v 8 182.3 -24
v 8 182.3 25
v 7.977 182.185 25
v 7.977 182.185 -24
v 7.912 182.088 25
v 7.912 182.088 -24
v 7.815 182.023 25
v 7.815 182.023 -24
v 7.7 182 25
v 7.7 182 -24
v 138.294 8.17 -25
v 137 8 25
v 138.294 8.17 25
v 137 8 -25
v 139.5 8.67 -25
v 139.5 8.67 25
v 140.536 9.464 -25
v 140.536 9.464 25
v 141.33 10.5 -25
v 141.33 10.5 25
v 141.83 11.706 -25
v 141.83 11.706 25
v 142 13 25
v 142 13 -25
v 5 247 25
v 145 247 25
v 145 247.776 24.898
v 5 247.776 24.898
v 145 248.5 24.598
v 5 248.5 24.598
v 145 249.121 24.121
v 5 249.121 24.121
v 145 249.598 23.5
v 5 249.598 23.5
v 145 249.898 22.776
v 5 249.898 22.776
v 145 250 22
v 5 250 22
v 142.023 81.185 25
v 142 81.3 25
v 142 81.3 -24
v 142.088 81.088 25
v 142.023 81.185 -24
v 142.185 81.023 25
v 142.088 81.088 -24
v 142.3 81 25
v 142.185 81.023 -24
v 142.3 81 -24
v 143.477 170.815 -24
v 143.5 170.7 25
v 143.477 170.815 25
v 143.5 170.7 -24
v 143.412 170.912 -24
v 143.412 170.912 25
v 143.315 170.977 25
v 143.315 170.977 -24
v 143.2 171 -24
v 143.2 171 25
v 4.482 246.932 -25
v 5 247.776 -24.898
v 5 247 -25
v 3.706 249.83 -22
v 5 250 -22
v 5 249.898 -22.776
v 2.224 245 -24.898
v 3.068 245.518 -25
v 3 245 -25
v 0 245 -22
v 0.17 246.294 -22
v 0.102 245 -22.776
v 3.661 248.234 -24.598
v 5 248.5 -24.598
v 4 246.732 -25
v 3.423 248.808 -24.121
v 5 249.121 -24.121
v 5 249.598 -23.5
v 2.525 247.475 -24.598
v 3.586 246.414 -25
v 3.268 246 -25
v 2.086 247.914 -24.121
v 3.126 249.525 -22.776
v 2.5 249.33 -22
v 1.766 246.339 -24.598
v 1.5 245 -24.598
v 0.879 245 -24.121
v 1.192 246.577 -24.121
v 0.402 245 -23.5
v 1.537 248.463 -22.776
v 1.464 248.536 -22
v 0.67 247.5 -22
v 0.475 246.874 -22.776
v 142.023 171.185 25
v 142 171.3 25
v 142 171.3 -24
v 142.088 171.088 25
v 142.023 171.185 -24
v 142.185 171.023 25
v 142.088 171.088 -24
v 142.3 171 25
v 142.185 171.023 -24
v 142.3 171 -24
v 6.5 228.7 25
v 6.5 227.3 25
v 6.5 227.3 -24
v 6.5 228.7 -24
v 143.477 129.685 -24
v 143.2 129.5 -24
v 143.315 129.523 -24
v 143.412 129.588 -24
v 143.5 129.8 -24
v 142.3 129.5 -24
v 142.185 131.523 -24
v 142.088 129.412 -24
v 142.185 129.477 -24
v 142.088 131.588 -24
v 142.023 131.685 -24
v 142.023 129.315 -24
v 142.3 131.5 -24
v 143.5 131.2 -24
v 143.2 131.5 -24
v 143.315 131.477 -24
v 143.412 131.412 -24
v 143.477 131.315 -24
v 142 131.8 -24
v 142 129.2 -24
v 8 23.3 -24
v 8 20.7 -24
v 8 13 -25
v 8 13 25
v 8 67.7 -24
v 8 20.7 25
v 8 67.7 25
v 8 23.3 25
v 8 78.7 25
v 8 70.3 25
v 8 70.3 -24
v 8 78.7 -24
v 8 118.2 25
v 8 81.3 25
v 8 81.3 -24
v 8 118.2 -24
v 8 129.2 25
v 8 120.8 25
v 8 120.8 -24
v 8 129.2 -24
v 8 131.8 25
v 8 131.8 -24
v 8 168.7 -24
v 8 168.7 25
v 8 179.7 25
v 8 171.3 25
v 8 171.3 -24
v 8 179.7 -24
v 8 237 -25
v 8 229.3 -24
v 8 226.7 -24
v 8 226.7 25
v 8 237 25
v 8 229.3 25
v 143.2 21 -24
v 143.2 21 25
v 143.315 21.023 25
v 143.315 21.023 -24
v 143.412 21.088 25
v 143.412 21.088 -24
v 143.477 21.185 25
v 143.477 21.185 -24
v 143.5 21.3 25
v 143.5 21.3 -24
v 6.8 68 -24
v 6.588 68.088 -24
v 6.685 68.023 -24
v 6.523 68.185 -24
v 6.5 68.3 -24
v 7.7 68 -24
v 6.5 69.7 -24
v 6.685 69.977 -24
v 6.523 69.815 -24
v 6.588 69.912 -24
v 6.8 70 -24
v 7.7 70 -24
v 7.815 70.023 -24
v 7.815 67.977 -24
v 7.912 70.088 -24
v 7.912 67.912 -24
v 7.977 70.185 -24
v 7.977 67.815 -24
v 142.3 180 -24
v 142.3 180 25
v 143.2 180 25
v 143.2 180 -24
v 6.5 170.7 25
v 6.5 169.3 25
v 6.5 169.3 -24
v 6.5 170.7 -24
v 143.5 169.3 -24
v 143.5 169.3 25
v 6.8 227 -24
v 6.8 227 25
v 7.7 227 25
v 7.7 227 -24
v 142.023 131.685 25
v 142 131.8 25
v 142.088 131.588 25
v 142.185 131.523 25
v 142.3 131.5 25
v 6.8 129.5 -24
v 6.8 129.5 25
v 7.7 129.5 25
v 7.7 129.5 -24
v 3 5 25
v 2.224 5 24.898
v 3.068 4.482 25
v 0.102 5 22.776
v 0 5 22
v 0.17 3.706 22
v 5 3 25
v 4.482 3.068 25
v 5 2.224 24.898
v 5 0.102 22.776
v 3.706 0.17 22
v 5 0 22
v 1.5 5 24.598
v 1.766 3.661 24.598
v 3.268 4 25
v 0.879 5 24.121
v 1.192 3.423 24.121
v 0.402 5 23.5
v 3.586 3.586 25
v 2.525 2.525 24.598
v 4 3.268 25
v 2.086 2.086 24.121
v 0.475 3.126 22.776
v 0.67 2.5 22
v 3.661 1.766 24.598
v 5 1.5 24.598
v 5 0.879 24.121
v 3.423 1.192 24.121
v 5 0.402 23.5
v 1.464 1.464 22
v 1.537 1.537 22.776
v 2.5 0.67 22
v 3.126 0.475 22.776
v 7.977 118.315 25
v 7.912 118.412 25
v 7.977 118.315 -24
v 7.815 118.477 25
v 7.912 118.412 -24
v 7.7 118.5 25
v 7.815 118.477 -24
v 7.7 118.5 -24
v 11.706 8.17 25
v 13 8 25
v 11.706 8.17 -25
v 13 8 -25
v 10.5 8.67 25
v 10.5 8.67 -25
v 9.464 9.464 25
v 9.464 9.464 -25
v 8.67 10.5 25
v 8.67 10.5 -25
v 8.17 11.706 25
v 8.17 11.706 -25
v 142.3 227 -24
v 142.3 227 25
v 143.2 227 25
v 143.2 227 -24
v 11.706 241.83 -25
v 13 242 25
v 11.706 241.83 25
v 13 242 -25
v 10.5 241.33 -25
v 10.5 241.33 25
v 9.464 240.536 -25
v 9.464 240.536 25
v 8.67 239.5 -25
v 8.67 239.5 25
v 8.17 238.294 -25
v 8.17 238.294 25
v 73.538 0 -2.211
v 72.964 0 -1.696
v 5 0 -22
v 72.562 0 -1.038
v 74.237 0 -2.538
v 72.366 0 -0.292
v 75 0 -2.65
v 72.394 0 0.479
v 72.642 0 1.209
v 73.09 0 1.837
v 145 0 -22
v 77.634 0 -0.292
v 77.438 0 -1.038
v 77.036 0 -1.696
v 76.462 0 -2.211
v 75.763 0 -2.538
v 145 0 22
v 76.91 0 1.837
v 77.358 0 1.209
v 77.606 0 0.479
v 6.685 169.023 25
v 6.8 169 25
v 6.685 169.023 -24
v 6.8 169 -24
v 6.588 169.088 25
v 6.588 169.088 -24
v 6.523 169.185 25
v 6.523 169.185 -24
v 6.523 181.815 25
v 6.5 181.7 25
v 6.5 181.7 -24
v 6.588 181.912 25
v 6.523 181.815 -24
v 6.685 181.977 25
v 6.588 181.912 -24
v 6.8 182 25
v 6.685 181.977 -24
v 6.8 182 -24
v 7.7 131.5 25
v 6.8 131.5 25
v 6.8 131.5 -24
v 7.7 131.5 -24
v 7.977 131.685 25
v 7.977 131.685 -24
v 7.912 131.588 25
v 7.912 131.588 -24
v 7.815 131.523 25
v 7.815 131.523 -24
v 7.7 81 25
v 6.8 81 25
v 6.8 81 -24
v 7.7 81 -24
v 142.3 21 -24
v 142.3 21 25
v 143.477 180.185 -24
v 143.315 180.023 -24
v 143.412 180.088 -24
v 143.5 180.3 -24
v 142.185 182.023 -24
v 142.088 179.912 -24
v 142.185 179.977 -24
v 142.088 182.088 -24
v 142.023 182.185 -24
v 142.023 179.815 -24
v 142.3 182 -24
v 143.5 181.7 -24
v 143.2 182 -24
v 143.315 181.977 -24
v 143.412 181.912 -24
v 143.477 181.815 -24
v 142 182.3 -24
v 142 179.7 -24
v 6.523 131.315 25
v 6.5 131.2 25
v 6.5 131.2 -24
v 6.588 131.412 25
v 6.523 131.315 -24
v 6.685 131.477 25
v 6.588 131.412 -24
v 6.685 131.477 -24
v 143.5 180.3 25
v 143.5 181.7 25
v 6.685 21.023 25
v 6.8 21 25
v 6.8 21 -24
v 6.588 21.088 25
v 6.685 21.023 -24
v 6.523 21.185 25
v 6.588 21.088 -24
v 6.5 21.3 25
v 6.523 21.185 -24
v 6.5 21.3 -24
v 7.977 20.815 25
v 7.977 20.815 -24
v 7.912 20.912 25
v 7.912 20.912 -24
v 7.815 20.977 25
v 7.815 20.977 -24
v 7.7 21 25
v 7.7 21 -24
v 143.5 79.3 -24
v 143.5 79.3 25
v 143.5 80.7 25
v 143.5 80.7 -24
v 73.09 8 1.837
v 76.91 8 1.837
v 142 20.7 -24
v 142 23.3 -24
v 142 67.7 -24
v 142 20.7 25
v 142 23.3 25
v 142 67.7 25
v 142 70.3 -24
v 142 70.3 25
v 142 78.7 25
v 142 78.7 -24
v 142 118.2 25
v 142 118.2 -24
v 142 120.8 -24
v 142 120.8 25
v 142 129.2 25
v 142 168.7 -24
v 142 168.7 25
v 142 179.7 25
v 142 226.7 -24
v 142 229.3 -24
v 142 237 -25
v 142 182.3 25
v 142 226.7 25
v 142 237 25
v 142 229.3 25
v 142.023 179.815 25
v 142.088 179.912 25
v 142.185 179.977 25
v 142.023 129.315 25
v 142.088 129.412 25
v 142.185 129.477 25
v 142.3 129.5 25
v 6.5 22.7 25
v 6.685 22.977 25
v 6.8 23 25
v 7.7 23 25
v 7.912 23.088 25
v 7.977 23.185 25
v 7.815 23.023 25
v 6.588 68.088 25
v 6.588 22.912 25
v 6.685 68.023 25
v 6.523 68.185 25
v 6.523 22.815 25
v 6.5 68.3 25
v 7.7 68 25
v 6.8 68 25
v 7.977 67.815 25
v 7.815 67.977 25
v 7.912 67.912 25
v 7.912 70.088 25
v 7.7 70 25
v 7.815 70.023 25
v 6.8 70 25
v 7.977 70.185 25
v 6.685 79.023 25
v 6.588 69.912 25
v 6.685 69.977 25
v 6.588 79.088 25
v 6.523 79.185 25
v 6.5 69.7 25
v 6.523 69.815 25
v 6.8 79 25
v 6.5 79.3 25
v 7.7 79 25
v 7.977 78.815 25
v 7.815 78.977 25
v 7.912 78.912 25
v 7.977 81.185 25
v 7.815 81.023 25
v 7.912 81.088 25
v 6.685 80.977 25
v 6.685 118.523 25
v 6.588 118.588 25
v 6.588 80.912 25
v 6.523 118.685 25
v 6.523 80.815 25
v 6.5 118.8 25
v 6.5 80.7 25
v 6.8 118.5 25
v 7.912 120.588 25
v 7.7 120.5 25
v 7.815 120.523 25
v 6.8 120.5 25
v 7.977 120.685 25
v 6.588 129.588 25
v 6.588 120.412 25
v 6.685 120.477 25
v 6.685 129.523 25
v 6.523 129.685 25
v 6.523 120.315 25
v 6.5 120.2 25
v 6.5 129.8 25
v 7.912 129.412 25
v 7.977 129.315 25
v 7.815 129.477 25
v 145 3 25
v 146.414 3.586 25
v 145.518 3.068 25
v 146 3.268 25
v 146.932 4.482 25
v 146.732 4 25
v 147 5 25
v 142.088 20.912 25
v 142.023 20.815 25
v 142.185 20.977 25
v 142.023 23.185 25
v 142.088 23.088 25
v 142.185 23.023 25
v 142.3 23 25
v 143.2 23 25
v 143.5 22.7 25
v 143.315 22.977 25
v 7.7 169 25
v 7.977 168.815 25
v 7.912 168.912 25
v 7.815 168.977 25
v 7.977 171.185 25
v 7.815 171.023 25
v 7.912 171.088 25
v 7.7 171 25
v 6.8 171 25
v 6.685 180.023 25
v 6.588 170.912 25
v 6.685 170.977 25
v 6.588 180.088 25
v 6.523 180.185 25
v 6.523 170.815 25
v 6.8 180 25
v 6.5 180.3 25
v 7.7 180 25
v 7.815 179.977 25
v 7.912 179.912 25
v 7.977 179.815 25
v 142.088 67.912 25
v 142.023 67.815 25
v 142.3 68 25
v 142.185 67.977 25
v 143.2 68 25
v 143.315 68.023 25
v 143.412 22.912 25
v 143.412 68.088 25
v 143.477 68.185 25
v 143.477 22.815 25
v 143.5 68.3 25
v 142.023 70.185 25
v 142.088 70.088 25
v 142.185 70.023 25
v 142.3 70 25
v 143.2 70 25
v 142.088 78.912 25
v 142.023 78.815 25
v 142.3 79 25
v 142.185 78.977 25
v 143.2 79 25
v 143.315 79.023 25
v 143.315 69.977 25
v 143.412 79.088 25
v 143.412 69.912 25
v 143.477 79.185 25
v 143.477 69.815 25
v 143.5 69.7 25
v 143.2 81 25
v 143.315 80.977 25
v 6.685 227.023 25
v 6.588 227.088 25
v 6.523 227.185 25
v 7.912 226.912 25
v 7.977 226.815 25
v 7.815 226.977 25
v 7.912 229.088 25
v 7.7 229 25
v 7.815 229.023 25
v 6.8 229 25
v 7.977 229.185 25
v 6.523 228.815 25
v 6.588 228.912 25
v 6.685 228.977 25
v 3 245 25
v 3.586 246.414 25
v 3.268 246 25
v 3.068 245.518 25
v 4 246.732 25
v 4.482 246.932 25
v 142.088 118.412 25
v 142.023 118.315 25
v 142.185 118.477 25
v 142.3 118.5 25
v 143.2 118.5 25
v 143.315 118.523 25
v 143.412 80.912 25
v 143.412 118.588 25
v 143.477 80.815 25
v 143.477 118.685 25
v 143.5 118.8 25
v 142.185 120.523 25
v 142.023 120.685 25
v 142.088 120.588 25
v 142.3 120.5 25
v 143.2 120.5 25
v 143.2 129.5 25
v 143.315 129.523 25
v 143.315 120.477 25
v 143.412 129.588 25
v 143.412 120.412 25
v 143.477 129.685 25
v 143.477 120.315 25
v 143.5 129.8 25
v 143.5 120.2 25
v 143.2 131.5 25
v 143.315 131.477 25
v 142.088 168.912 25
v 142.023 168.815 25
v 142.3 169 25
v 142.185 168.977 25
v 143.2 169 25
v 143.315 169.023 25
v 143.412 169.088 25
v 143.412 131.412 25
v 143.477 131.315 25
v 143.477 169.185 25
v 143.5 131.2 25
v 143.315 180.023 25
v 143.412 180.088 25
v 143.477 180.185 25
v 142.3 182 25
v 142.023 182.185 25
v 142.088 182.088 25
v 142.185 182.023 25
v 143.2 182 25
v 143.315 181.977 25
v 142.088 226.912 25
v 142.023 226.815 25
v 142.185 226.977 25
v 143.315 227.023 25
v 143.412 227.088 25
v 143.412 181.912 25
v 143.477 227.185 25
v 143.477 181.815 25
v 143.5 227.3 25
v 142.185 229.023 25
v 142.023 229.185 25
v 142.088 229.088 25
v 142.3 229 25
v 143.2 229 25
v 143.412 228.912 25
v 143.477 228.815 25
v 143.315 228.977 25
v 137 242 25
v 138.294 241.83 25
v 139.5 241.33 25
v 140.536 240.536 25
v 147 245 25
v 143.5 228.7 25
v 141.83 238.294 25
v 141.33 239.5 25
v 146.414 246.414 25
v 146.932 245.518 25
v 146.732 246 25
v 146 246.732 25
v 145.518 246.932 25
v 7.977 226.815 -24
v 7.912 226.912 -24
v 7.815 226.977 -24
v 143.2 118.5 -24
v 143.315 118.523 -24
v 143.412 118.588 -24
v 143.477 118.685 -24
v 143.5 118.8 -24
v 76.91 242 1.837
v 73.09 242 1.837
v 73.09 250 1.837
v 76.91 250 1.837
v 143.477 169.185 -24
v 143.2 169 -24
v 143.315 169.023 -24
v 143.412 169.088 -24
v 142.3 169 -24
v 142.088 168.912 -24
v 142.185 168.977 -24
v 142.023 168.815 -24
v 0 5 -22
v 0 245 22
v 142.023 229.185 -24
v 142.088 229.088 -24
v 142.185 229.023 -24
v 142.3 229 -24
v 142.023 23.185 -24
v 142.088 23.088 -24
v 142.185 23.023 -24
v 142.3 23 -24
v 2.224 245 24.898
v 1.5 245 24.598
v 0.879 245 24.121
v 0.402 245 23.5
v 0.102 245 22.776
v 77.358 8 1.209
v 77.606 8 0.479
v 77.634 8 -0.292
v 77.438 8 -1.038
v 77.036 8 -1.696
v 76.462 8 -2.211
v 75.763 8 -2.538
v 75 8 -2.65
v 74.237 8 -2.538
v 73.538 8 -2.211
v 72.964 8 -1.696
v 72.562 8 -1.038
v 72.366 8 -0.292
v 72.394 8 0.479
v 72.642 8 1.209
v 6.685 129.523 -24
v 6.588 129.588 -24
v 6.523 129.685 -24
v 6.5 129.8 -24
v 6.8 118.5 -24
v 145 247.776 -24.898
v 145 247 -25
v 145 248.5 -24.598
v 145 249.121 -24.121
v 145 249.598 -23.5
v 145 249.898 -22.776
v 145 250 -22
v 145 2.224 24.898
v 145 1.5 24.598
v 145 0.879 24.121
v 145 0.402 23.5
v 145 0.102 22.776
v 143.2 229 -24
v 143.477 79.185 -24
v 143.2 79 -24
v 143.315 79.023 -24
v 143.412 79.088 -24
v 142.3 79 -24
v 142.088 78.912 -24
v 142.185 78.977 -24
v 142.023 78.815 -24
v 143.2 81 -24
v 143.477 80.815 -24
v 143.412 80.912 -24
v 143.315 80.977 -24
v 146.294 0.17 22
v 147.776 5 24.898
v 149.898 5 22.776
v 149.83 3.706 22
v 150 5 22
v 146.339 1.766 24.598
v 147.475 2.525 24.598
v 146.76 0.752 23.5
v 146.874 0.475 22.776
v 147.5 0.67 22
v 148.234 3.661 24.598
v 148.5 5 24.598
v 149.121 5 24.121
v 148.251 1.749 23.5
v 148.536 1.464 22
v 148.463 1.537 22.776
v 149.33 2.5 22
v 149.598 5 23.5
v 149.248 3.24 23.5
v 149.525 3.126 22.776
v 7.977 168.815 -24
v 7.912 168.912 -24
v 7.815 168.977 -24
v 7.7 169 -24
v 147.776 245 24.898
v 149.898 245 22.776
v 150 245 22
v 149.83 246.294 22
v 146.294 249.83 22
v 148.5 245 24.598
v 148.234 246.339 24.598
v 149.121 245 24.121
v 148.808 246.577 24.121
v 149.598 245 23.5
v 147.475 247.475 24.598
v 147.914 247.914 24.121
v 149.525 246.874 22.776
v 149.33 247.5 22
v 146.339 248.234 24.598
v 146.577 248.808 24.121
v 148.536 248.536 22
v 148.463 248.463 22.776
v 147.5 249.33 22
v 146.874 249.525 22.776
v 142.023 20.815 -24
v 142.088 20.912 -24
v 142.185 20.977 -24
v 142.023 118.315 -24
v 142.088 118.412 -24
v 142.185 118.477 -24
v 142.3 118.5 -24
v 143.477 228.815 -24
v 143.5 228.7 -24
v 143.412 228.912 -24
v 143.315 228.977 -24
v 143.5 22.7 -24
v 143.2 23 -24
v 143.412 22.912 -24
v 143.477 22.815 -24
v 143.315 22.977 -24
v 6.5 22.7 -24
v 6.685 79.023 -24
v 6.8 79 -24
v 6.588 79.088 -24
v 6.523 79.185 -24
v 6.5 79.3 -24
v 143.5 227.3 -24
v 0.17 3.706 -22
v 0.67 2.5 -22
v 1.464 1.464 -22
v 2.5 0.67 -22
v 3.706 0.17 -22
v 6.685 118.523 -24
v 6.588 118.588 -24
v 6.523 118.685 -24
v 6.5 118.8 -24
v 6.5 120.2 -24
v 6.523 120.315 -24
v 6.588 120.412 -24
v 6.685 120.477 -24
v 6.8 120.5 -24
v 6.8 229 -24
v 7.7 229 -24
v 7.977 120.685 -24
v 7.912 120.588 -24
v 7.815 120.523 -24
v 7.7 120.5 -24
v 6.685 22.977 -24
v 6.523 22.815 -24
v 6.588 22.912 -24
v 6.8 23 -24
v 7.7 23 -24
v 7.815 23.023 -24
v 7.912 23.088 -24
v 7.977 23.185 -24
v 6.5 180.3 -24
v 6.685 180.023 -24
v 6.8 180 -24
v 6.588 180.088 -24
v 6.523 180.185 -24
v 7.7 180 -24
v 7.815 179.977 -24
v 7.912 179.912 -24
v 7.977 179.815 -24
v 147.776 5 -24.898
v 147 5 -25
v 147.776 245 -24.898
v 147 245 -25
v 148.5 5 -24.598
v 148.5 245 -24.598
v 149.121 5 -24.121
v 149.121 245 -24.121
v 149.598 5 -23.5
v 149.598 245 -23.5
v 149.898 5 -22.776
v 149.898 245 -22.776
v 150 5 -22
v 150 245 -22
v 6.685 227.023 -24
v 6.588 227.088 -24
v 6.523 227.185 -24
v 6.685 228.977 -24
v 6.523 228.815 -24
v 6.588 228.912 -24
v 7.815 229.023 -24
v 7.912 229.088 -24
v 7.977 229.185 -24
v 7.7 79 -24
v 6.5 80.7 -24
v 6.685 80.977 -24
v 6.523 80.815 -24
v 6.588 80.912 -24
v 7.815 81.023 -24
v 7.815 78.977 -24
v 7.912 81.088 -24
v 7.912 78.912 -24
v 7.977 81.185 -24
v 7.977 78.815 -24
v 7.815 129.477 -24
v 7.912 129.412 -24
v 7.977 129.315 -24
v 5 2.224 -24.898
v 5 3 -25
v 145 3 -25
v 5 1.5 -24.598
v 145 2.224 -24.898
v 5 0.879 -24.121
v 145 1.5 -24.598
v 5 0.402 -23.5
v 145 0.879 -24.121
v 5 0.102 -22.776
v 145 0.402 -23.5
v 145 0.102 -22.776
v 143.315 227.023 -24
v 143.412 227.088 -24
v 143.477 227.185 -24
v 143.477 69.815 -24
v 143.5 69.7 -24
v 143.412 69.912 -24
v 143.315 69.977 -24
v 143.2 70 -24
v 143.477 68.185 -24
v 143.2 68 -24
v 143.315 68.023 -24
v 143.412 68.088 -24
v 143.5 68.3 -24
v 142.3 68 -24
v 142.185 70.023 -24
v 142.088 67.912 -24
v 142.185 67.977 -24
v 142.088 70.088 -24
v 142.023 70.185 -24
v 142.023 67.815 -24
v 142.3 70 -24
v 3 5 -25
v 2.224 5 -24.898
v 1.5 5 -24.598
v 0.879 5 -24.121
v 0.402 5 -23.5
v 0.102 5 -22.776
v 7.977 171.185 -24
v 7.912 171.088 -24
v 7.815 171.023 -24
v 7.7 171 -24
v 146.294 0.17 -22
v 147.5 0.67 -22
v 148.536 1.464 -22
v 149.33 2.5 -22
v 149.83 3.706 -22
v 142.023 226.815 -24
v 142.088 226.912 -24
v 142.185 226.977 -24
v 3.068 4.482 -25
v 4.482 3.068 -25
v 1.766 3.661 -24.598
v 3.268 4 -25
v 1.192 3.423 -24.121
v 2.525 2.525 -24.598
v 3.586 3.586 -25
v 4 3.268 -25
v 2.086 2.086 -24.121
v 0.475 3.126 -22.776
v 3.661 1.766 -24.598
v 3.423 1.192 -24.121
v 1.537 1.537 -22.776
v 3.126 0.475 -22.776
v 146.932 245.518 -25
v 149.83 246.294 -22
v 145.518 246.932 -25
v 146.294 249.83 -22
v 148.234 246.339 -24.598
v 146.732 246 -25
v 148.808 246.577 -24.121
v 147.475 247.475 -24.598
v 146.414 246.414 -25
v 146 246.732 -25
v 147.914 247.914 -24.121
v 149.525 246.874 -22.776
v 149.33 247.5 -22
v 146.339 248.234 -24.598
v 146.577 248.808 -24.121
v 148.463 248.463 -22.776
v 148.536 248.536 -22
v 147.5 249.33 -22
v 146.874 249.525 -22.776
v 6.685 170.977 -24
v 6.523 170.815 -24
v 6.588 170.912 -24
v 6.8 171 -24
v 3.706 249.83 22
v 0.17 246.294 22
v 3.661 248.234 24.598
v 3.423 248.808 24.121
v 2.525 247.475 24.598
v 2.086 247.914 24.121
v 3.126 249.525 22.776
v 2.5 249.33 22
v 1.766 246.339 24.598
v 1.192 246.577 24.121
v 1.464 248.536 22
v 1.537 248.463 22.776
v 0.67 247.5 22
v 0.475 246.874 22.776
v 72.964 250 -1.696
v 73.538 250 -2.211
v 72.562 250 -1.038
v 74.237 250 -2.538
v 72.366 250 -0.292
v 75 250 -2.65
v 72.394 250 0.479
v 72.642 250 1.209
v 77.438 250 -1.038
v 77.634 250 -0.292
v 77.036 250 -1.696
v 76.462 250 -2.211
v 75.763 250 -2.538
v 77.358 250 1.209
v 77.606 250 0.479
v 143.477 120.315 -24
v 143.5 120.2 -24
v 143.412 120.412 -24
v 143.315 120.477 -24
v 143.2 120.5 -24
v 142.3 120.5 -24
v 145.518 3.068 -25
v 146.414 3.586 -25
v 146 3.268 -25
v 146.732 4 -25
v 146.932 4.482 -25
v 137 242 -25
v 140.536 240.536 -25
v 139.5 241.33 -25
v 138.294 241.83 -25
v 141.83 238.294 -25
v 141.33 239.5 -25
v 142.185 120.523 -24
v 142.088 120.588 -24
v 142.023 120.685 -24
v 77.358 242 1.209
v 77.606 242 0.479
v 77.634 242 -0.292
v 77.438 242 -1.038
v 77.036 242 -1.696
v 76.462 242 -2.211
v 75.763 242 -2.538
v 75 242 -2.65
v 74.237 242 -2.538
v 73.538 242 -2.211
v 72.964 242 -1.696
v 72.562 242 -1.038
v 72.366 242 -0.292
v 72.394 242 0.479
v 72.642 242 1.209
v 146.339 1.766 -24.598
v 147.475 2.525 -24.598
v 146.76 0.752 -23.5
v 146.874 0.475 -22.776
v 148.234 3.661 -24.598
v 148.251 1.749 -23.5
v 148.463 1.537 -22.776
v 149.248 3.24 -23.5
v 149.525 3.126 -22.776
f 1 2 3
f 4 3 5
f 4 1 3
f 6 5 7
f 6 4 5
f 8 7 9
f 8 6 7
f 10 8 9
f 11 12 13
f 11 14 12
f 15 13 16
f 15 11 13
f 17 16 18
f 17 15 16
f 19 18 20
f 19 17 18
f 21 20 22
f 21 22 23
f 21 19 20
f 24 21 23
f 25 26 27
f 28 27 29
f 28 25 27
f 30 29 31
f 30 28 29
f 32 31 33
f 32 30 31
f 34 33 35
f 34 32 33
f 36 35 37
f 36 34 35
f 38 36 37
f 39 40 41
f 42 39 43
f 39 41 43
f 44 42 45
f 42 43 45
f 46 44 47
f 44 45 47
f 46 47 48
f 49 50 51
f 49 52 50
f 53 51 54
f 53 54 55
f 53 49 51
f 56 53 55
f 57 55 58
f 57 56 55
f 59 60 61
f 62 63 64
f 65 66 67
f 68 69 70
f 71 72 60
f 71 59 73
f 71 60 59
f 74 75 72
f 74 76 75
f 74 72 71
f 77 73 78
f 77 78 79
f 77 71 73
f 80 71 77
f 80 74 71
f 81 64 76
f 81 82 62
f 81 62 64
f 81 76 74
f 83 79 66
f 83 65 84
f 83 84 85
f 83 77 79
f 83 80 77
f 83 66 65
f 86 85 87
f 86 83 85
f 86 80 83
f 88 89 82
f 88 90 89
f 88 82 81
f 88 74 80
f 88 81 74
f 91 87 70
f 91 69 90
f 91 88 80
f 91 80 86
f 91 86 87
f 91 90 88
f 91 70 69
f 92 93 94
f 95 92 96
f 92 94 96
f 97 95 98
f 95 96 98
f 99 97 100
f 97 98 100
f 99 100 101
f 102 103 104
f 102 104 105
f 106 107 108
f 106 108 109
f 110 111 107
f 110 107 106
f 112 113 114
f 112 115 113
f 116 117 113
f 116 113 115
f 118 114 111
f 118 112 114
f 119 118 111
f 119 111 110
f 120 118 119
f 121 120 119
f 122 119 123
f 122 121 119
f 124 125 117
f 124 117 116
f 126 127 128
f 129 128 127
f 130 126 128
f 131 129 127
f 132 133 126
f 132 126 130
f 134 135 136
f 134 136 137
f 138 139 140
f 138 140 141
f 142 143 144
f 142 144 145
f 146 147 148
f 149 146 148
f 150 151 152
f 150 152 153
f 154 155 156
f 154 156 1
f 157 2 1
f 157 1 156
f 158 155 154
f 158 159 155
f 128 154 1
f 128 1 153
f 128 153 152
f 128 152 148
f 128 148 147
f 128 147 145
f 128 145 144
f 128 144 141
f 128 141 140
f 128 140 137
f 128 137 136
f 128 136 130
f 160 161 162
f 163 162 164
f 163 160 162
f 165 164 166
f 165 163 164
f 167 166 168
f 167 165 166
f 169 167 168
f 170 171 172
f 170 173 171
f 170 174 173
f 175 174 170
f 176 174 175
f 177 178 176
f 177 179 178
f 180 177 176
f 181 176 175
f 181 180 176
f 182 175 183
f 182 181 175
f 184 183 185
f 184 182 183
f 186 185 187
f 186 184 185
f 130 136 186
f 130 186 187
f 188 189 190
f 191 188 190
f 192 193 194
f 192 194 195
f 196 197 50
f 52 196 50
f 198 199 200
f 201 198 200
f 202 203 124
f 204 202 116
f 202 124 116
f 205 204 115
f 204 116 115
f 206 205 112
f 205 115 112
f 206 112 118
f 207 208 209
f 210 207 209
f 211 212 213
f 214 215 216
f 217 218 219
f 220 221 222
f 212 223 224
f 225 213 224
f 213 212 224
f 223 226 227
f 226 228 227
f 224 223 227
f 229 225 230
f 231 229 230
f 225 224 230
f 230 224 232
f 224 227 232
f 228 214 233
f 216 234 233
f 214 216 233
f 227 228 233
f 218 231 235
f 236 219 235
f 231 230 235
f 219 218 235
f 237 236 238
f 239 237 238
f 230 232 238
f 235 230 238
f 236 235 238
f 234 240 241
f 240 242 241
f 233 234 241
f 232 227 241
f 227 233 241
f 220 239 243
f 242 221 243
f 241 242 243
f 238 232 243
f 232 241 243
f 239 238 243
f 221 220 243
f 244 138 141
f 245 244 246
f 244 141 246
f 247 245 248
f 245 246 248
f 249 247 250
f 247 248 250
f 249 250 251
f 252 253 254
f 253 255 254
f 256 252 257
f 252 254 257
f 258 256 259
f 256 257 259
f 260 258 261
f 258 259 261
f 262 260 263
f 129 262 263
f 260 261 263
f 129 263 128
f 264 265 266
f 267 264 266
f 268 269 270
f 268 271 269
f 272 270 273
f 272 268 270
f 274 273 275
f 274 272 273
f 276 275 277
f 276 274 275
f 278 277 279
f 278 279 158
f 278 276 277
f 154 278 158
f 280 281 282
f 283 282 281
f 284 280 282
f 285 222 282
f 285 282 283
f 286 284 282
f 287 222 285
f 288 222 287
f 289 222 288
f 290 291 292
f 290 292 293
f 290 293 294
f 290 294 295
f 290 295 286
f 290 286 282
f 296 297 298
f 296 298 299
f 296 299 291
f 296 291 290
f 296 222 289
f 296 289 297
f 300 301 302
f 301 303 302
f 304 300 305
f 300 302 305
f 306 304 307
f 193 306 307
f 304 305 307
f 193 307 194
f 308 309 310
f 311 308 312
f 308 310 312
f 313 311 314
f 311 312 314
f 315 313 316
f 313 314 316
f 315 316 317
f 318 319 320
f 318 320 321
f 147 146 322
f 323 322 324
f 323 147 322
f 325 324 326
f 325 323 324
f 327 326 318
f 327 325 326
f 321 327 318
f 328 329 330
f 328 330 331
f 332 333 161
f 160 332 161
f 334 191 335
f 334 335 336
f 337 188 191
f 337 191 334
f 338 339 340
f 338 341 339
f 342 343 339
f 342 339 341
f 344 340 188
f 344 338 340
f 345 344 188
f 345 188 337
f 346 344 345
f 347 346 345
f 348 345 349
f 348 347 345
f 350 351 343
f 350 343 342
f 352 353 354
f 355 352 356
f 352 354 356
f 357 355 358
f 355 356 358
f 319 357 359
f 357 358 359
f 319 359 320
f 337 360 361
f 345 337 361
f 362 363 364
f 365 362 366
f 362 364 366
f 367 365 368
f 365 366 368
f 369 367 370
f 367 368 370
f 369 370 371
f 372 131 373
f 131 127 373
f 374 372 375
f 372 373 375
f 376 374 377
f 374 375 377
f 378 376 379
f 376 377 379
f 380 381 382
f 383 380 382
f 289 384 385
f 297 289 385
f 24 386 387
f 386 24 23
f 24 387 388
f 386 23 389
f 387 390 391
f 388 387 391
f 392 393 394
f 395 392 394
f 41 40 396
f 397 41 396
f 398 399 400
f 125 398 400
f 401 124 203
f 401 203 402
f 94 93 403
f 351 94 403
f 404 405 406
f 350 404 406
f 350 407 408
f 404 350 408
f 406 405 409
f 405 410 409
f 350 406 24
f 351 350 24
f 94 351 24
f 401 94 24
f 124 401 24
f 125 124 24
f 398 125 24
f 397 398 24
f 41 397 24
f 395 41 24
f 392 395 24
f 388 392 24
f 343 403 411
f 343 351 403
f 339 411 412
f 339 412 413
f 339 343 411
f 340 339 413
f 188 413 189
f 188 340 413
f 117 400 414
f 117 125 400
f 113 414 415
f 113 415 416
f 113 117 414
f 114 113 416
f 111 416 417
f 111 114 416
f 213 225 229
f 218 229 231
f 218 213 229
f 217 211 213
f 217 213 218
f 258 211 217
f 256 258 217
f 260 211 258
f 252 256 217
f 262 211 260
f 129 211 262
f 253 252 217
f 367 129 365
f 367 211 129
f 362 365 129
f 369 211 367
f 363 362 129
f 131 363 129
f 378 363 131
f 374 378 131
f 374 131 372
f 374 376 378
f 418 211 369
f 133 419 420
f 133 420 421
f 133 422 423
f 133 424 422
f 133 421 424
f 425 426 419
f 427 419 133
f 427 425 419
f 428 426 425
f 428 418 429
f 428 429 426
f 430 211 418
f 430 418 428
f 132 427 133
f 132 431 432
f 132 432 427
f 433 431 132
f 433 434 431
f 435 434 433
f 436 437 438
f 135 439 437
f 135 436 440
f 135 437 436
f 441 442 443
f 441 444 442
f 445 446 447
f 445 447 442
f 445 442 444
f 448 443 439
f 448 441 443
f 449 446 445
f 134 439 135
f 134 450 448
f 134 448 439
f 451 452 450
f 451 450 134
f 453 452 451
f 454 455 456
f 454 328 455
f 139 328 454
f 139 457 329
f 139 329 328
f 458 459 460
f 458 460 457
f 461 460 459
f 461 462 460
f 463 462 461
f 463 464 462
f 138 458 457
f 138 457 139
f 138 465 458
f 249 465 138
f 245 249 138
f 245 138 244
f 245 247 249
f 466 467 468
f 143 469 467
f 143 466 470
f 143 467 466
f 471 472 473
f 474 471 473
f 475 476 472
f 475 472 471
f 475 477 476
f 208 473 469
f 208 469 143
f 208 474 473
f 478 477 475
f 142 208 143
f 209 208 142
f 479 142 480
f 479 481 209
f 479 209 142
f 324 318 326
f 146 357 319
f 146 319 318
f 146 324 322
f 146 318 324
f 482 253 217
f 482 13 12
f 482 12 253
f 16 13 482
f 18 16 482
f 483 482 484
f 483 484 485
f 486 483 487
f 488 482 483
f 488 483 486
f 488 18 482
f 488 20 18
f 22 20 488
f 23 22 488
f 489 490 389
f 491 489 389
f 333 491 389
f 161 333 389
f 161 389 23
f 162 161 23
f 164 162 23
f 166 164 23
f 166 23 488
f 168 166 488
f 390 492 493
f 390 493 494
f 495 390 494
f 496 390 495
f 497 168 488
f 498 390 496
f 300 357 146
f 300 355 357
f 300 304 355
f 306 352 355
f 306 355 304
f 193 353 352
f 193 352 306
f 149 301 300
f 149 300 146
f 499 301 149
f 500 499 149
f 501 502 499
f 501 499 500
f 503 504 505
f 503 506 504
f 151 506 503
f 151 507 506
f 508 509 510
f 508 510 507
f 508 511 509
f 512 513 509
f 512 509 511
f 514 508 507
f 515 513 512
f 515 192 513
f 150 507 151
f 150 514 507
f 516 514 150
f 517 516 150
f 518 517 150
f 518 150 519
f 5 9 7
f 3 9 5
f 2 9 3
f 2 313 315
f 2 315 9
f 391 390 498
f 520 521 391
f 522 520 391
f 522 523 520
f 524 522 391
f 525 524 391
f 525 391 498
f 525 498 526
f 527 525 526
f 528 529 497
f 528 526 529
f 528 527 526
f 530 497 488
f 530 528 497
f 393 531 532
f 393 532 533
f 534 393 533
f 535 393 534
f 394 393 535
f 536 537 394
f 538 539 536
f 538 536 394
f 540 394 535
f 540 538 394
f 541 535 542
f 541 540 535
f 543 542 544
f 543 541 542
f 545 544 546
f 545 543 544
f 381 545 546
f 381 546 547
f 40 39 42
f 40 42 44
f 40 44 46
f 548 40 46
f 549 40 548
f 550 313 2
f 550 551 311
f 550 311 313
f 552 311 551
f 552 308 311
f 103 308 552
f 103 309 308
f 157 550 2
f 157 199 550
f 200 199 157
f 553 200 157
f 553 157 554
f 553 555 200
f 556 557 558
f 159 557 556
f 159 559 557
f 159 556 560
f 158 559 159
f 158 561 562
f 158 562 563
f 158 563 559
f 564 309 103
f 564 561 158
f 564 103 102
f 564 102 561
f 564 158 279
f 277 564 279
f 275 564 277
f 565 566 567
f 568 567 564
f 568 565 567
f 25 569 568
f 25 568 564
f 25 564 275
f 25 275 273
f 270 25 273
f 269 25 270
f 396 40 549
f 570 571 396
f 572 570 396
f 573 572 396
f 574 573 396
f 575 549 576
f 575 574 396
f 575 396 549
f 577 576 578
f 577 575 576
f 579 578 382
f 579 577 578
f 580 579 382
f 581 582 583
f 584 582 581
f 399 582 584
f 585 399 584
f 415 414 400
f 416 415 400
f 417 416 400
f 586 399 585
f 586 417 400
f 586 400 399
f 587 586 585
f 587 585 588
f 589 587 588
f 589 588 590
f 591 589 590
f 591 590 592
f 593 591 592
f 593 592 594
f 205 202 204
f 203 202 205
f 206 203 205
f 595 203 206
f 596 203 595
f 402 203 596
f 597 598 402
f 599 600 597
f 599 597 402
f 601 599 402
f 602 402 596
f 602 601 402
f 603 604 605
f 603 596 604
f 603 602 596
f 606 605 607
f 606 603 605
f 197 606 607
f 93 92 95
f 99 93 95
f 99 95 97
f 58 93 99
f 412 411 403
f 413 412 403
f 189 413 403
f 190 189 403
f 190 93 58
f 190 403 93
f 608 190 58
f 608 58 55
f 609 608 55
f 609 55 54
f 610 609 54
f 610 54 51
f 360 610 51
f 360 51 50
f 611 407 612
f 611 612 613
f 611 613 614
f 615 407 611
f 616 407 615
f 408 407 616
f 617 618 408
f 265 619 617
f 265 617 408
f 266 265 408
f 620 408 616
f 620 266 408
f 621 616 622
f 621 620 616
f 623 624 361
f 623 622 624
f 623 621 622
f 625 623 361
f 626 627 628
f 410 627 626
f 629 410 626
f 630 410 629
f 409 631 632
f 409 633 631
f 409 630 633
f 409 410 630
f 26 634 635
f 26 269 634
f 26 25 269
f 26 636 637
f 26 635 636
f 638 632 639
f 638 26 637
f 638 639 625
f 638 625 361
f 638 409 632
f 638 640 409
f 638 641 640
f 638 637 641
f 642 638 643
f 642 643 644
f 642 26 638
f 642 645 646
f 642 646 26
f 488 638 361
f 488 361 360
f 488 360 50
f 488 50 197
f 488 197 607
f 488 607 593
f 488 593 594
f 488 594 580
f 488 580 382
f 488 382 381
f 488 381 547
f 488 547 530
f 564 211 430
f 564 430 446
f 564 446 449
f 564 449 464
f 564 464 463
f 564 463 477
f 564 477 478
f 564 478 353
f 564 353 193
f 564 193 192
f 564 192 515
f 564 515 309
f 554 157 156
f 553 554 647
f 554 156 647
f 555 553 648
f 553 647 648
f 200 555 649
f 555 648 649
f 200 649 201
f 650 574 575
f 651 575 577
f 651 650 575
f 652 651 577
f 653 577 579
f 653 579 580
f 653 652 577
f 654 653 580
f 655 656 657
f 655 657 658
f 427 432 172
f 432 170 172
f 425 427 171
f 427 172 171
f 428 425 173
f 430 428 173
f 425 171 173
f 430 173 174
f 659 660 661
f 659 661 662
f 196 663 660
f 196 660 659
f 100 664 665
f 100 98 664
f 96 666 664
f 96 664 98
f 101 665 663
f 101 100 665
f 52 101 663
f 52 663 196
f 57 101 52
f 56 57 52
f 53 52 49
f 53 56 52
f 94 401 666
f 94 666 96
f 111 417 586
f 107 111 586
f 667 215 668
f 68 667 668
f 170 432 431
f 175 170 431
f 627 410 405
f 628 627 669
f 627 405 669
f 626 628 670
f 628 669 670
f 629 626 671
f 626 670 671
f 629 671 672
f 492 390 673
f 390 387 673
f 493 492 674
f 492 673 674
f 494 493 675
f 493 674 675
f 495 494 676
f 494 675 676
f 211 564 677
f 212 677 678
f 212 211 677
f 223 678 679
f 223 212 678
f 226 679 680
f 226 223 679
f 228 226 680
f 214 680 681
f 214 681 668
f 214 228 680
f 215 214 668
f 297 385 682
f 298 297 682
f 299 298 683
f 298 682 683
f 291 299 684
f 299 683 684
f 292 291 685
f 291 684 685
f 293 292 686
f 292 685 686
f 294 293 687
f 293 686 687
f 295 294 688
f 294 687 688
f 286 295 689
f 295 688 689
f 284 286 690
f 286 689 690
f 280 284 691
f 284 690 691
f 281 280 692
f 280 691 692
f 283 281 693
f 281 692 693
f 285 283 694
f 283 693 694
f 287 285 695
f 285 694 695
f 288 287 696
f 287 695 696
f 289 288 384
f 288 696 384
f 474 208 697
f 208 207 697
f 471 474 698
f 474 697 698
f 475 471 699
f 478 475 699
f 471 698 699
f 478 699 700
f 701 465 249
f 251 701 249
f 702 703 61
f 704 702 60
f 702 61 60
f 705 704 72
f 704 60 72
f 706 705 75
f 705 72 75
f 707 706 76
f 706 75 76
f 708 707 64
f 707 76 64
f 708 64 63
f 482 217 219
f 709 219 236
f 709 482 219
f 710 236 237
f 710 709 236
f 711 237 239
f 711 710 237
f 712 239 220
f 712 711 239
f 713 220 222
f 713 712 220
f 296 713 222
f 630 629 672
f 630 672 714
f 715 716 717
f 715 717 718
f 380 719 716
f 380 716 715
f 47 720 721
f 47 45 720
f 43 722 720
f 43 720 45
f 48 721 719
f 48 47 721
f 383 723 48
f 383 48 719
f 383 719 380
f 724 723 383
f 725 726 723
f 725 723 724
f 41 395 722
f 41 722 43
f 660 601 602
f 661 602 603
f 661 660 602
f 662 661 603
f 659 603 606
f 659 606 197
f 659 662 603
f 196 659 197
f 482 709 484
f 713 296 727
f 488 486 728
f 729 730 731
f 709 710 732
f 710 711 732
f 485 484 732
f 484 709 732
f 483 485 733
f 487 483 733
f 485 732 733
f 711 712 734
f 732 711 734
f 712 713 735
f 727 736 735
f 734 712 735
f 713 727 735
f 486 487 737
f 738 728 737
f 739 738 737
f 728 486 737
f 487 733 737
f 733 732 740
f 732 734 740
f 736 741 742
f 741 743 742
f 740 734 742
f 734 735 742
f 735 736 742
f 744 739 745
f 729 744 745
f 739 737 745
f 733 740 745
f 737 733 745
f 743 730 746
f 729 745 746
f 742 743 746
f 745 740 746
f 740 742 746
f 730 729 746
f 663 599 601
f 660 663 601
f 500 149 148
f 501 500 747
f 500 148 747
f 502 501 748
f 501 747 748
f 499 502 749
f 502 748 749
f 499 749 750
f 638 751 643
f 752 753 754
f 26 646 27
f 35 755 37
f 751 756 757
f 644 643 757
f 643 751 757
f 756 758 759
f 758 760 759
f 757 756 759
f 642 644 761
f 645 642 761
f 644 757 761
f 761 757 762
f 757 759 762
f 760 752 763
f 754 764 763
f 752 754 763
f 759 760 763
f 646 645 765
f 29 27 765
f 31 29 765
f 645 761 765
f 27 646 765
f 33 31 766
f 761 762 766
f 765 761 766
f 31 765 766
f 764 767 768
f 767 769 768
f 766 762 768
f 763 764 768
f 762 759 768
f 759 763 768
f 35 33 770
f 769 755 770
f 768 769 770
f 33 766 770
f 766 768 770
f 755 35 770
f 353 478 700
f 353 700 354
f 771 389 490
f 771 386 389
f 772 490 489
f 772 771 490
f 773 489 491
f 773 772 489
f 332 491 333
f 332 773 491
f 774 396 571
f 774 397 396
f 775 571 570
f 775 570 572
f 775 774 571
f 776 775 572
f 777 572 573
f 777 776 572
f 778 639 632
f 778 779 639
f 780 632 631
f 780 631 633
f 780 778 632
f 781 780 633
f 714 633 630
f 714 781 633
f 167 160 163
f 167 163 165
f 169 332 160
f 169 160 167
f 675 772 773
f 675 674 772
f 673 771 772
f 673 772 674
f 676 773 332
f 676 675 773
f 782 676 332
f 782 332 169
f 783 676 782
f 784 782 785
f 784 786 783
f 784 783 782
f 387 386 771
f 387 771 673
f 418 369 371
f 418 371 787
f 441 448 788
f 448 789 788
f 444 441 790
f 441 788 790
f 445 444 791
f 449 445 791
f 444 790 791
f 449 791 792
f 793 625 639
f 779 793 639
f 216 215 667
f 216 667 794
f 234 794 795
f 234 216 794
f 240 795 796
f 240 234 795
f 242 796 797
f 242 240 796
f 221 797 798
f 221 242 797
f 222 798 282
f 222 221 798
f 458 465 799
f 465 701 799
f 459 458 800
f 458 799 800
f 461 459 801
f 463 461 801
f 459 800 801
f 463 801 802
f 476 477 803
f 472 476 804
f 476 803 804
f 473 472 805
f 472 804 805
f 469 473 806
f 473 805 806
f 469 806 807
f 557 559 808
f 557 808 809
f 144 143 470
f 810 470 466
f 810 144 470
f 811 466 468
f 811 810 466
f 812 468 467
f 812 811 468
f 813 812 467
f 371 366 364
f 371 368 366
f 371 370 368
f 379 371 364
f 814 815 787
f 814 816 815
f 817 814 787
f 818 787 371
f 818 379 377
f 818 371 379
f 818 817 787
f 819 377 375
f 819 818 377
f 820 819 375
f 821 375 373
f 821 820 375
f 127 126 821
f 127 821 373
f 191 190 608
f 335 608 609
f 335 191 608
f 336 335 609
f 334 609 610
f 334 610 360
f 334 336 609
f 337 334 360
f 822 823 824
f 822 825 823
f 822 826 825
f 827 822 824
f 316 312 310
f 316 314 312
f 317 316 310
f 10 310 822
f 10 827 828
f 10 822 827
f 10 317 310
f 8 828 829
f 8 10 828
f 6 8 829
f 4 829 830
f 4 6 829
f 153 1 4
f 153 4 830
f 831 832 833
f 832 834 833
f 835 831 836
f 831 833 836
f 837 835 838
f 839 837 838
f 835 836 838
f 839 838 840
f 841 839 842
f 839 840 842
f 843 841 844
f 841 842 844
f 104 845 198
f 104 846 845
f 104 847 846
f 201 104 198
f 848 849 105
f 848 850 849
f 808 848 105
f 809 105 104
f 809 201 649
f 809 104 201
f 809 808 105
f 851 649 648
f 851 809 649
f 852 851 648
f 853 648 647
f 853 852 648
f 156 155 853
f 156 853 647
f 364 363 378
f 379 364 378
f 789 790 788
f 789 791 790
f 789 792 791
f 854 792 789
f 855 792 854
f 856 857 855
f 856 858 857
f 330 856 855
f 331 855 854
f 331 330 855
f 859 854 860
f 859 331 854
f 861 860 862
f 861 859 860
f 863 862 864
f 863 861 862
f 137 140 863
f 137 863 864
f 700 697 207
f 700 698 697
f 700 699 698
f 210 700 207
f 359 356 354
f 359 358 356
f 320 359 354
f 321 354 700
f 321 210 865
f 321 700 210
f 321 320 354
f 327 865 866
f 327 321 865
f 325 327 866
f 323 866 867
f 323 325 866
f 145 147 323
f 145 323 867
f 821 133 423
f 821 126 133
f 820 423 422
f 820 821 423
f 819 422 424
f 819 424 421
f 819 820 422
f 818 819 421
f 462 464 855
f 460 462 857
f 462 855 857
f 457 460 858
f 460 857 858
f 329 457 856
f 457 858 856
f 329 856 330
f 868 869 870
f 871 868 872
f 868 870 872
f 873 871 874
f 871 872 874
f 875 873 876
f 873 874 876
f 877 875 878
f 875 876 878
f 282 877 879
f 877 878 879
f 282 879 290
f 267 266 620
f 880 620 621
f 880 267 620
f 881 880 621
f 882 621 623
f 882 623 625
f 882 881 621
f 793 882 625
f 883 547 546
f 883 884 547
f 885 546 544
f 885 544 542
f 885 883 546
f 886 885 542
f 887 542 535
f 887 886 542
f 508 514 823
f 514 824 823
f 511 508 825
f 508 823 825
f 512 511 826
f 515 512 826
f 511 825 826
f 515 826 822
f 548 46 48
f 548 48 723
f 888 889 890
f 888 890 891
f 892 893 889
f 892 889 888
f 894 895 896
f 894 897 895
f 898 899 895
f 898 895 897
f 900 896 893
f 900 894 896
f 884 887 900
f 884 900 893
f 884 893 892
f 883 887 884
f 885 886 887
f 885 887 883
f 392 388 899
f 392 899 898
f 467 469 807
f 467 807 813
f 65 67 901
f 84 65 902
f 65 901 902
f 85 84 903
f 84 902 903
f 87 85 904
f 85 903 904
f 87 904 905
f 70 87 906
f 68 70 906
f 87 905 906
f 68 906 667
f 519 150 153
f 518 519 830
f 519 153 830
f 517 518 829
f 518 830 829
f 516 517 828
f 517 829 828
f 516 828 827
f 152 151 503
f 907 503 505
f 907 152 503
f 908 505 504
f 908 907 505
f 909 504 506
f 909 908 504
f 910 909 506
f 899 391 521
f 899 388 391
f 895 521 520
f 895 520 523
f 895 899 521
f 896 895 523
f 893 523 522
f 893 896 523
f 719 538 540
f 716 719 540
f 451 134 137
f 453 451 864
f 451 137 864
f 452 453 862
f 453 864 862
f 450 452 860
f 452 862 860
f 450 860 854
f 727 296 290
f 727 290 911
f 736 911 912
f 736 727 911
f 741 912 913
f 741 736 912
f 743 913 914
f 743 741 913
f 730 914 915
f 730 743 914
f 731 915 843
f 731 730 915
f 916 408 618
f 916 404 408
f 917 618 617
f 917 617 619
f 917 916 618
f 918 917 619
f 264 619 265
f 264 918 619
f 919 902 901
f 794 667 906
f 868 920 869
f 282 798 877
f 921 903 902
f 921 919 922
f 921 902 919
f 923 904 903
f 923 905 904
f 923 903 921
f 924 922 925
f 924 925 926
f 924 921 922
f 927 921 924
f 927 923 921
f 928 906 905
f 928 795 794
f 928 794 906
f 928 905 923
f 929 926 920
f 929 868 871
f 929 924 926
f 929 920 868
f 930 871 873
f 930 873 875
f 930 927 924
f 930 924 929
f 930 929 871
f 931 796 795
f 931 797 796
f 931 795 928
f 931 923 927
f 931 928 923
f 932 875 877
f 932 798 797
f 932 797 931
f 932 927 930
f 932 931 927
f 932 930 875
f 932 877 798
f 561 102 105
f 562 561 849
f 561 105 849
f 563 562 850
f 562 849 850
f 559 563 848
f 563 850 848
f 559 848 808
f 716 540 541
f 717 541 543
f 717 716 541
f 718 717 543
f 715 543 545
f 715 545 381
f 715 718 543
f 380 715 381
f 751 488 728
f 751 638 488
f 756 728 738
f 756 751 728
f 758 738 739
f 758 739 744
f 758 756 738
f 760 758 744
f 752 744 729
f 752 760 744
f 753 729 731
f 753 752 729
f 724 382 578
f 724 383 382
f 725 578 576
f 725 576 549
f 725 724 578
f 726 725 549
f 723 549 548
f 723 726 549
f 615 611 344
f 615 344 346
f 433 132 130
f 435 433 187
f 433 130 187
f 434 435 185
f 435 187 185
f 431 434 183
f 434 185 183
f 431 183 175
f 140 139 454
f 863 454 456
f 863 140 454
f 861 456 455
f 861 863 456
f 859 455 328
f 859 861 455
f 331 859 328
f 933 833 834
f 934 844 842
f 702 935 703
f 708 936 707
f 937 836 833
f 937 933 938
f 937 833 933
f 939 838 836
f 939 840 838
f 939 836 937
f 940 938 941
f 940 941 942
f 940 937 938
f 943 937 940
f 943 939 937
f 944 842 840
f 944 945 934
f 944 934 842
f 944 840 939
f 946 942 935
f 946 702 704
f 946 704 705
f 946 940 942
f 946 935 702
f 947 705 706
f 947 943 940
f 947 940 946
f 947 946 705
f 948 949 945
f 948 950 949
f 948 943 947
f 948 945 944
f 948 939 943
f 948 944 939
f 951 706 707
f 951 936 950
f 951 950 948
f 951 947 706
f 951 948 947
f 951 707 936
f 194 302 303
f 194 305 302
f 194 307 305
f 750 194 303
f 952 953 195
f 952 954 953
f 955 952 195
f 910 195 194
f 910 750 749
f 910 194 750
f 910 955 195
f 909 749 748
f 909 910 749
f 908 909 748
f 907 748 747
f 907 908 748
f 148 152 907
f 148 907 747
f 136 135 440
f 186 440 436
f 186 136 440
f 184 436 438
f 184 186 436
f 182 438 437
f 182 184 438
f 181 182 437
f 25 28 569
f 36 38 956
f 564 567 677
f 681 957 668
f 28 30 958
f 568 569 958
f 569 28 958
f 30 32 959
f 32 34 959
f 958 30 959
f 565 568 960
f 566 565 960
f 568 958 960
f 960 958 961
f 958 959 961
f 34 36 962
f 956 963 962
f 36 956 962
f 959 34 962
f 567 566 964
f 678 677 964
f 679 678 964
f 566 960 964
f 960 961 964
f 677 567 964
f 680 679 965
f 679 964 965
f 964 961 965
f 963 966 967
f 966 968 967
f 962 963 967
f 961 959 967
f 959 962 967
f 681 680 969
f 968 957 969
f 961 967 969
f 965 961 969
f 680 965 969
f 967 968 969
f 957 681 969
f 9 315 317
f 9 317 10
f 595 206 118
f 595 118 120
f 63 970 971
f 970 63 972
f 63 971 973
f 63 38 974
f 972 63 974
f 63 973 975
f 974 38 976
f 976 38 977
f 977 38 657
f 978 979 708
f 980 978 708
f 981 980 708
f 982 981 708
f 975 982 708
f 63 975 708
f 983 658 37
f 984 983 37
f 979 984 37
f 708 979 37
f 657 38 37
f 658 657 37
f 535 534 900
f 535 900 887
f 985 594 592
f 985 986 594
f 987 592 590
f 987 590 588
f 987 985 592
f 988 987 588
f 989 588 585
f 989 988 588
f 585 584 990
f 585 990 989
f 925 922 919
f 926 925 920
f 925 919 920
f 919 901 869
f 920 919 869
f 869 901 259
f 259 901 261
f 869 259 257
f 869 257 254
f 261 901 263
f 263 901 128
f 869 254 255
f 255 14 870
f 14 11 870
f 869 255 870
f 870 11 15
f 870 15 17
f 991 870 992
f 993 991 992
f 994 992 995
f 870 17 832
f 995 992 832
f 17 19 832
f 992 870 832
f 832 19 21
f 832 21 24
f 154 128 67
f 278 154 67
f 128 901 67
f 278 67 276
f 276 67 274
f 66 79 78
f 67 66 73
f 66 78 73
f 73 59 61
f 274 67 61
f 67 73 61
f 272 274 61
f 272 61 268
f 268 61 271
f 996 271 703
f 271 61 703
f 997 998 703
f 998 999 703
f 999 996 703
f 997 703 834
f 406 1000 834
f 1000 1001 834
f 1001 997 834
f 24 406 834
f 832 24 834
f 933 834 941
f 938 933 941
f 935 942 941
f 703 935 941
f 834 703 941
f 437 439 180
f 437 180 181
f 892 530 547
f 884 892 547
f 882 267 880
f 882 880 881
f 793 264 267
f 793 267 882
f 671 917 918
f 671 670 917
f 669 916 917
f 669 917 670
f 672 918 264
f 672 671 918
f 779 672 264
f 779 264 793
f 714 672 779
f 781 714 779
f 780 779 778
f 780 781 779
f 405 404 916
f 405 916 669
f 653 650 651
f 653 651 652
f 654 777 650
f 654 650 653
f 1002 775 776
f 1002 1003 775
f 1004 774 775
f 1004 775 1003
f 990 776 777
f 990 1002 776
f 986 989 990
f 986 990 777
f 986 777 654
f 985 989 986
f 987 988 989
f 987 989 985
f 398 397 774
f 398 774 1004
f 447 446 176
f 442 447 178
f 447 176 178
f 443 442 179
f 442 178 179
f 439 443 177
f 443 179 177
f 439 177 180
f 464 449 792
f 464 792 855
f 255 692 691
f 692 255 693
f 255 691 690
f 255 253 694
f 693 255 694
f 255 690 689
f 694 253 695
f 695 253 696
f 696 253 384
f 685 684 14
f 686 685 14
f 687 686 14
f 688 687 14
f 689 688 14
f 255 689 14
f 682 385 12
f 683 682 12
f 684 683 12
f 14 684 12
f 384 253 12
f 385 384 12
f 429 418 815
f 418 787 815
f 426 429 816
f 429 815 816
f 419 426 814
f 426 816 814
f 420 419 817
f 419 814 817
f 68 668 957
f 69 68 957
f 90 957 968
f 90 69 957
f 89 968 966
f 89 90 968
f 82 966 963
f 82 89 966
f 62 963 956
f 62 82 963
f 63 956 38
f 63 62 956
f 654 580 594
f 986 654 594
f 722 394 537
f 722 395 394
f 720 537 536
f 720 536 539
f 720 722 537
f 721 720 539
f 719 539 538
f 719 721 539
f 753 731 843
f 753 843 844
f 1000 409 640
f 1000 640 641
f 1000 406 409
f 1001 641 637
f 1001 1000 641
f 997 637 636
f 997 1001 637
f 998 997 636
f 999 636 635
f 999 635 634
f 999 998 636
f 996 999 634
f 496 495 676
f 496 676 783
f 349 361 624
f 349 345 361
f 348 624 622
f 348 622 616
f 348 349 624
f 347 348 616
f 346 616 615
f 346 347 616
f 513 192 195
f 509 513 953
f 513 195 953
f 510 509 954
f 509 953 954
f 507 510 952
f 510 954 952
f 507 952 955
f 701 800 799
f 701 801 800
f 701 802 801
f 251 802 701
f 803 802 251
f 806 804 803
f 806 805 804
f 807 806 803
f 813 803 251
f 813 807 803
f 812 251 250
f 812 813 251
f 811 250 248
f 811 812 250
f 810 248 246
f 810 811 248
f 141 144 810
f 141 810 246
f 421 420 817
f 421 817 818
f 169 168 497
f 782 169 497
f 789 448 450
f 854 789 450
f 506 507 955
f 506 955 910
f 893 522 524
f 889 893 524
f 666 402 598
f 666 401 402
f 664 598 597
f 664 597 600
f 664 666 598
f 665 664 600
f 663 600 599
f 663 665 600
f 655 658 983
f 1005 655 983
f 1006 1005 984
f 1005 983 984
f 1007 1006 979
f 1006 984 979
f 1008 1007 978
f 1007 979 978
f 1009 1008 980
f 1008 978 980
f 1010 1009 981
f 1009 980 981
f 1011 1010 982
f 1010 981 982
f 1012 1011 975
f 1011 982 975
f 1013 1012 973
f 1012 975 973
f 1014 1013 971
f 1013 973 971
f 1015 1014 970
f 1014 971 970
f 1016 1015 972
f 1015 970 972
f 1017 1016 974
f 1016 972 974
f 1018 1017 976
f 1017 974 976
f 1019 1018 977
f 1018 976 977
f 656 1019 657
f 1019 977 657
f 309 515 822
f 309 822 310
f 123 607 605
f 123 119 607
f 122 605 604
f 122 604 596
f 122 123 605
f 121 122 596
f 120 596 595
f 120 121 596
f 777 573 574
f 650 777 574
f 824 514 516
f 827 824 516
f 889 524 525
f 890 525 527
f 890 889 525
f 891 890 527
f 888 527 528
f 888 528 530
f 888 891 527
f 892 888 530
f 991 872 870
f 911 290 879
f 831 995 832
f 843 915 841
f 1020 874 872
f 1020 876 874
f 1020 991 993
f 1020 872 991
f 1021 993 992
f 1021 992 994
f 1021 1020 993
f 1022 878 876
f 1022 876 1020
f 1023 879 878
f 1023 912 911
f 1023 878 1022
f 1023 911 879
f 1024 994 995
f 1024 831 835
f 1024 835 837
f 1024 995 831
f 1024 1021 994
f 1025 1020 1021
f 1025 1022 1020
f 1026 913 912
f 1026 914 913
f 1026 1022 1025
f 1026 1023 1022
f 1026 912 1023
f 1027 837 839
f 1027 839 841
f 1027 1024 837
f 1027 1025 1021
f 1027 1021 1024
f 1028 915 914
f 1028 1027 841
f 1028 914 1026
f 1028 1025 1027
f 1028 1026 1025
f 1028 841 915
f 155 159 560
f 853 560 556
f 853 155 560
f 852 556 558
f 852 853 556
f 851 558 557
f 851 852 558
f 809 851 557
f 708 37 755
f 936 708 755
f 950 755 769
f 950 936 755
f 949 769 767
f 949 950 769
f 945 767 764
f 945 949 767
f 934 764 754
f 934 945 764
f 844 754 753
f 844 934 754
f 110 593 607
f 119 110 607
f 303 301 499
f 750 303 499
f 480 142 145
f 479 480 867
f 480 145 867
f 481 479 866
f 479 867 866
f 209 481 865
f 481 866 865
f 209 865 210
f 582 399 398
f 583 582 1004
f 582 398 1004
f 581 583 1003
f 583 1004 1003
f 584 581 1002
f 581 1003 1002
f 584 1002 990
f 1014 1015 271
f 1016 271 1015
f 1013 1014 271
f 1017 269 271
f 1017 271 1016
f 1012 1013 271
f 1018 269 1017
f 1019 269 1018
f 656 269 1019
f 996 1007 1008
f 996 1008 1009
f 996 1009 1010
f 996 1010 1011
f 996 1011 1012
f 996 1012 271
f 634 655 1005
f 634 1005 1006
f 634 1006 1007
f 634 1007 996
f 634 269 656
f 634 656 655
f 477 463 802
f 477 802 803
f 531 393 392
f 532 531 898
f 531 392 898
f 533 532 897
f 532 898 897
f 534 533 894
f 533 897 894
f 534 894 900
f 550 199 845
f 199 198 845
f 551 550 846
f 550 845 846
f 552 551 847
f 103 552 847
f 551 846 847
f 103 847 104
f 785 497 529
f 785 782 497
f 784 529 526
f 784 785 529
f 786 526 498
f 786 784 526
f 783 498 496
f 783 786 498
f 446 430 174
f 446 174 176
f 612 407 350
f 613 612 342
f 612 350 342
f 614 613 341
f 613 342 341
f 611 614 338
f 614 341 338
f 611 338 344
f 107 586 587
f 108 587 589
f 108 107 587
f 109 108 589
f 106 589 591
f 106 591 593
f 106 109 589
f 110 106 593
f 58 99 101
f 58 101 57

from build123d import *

# Parameters (mm, degrees)
SKETCH1_W           = 150
SKETCH1_H           = 250
BOSS_EXTRUDE1_DEPTH = 25
SKETCH2_W           = 134
SKETCH2_H           = 234
CUT_EXTRUDE1_DEPTH  = 51
CUT_EXTRUDE2_DEPTH  = 251
SKETCH7_W           = 1.5
SKETCH7_H           = 2
CUT_EXTRUDE5_DEPTH  = 49
FILLET1_R           = 5
FILLET2_R           = 3
FILLET3_R           = 0.3


with BuildPart() as part:
    # Sketch1 → Boss-Extrude1 (new body, symmetric)
    with BuildSketch(Plane.XY):
        with Locations((75, 125)):
            Rectangle(SKETCH1_W, SKETCH1_H)
    extrude(amount=BOSS_EXTRUDE1_DEPTH, both=True)

    # Sketch2 → Cut-Extrude1 (cut, through all)
    with BuildSketch(Plane.XY.offset(25)):
        with Locations((75, 125)):
            Rectangle(SKETCH2_W, SKETCH2_H)
    extrude(amount=-CUT_EXTRUDE1_DEPTH, mode=Mode.SUBTRACT)

    # Sketch3 → Cut-Extrude2 (cut, through all)
    with BuildSketch(Plane(origin=(0, 250, 0), x_dir=(1, 0, 0), z_dir=(0, 1, 0))):
        with BuildLine():
            Line((73.09, -1.836954001), (76.91, -1.836954001))
            ThreePointArc((76.91, -1.836954001), (75, 2.65), (73.09, -1.836954001))
        make_face()
    extrude(amount=-CUT_EXTRUDE2_DEPTH, mode=Mode.SUBTRACT)

    # Sketch7 → Cut-Extrude5 (cut)
    with BuildSketch(Plane.XY.offset(25)):
        with Locations((7.25, 181)):
            Rectangle(SKETCH7_W, SKETCH7_H)
        with Locations((7.25, 228)):
            Rectangle(SKETCH7_W, SKETCH7_H)
        with Locations((7.25, 170)):
            Rectangle(SKETCH7_W, SKETCH7_H)
        with Locations((7.25, 80)):
            Rectangle(SKETCH7_W, SKETCH7_H)
        with Locations((7.25, 22)):
            Rectangle(SKETCH7_W, SKETCH7_H)
        with Locations((7.25, 69)):
            Rectangle(SKETCH7_W, SKETCH7_H)
        with Locations((7.25, 130.5)):
            Rectangle(SKETCH7_W, SKETCH7_H)
        with Locations((7.25, 119.5)):
            Rectangle(SKETCH7_W, SKETCH7_H)
        with Locations((142.75, 119.5)):
            Rectangle(SKETCH7_W, SKETCH7_H)
        with Locations((142.75, 130.5)):
            Rectangle(SKETCH7_W, SKETCH7_H)
        with Locations((142.75, 69)):
            Rectangle(SKETCH7_W, SKETCH7_H)
        with Locations((142.75, 22)):
            Rectangle(SKETCH7_W, SKETCH7_H)
        with Locations((142.75, 80)):
            Rectangle(SKETCH7_W, SKETCH7_H)
        with Locations((142.75, 170)):
            Rectangle(SKETCH7_W, SKETCH7_H)
        with Locations((142.75, 181)):
            Rectangle(SKETCH7_W, SKETCH7_H)
        with Locations((142.75, 228)):
            Rectangle(SKETCH7_W, SKETCH7_H)
    extrude(amount=-CUT_EXTRUDE5_DEPTH, mode=Mode.SUBTRACT)

    # Fillet1
    fillet1_edges = [part.edges().sort_by_distance(p)[0] for p in [
        (142, 242, 0),
        (142, 8, 0),
        (8, 8, 0),
        (8, 242, 0),
        (0, 250, 0),
        (150, 250, 0),
        (150, 0, 0),
        (0, 0, 0),
    ]]
    fillet(fillet1_edges, radius=FILLET1_R)

    # Fillet2
    fillet2_edges = [part.edges().sort_by_distance(p)[0] for p in [
        (150, 125, -25),
        (150, 125, 25),
        (0, 125, -25),
        (75, 250, -25),
        (75, 0, -25),
        (1.464466094, 248.535533906, -25),
        (148.535533906, 248.535533906, -25),
        (1.464466094, 1.464466094, -25),
        (148.535533906, 1.464466094, -25),
        (75, 0, 25),
        (0, 125, 25),
        (75, 250, 25),
        (1.464466094, 248.535533906, 25),
        (148.535533906, 248.535533906, 25),
        (1.464466094, 1.464466094, 25),
        (148.535533906, 1.464466094, 25),
    ]]
    fillet(fillet2_edges, radius=FILLET2_R)

    # Fillet3
    fillet3_edges = [part.edges().sort_by_distance(p)[0] for p in [
        (6.5, 70, 0.5),
        (8, 70, 0.5),
        (6.5, 129.5, 0.5),
        (6.5, 131.5, 0.5),
        (8, 131.5, 0.5),
        (8, 129.5, 0.5),
        (6.5, 118.5, 0.5),
        (6.5, 120.5, 0.5),
        (8, 120.5, 0.5),
        (8, 118.5, 0.5),
        (143.5, 131.5, 0.5),
        (143.5, 129.5, 0.5),
        (142, 129.5, 0.5),
        (142, 131.5, 0.5),
        (8, 21, 0.5),
        (6.5, 21, 0.5),
        (6.5, 23, 0.5),
        (8, 23, 0.5),
        (6.5, 79, 0.5),
        (6.5, 81, 0.5),
        (8, 81, 0.5),
        (8, 79, 0.5),
        (6.5, 169, 0.5),
        (6.5, 171, 0.5),
        (8, 171, 0.5),
        (8, 169, 0.5),
        (6.5, 227, 0.5),
        (6.5, 229, 0.5),
        (8, 229, 0.5),
        (8, 227, 0.5),
        (143.5, 81, 0.5),
        (143.5, 79, 0.5),
        (142, 79, 0.5),
        (142, 81, 0.5),
        (143.5, 23, 0.5),
        (143.5, 21, 0.5),
        (142, 21, 0.5),
        (142, 23, 0.5),
        (143.5, 70, 0.5),
        (143.5, 68, 0.5),
        (142, 68, 0.5),
        (142, 70, 0.5),
        (142, 120.5, 0.5),
        (143.5, 120.5, 0.5),
        (143.5, 118.5, 0.5),
        (142, 118.5, 0.5),
        (142, 171, 0.5),
        (143.5, 171, 0.5),
        (143.5, 169, 0.5),
        (142, 169, 0.5),
        (142, 182, 0.5),
        (143.5, 182, 0.5),
        (143.5, 180, 0.5),
        (142, 180, 0.5),
        (142, 229, 0.5),
        (143.5, 229, 0.5),
        (143.5, 227, 0.5),
        (142, 227, 0.5),
        (6.5, 180, 0.5),
        (6.5, 182, 0.5),
        (8, 182, 0.5),
        (8, 180, 0.5),
        (8, 68, 0.5),
        (6.5, 68, 0.5),
    ]]
    fillet(fillet3_edges, radius=FILLET3_R)


solid = part.part
